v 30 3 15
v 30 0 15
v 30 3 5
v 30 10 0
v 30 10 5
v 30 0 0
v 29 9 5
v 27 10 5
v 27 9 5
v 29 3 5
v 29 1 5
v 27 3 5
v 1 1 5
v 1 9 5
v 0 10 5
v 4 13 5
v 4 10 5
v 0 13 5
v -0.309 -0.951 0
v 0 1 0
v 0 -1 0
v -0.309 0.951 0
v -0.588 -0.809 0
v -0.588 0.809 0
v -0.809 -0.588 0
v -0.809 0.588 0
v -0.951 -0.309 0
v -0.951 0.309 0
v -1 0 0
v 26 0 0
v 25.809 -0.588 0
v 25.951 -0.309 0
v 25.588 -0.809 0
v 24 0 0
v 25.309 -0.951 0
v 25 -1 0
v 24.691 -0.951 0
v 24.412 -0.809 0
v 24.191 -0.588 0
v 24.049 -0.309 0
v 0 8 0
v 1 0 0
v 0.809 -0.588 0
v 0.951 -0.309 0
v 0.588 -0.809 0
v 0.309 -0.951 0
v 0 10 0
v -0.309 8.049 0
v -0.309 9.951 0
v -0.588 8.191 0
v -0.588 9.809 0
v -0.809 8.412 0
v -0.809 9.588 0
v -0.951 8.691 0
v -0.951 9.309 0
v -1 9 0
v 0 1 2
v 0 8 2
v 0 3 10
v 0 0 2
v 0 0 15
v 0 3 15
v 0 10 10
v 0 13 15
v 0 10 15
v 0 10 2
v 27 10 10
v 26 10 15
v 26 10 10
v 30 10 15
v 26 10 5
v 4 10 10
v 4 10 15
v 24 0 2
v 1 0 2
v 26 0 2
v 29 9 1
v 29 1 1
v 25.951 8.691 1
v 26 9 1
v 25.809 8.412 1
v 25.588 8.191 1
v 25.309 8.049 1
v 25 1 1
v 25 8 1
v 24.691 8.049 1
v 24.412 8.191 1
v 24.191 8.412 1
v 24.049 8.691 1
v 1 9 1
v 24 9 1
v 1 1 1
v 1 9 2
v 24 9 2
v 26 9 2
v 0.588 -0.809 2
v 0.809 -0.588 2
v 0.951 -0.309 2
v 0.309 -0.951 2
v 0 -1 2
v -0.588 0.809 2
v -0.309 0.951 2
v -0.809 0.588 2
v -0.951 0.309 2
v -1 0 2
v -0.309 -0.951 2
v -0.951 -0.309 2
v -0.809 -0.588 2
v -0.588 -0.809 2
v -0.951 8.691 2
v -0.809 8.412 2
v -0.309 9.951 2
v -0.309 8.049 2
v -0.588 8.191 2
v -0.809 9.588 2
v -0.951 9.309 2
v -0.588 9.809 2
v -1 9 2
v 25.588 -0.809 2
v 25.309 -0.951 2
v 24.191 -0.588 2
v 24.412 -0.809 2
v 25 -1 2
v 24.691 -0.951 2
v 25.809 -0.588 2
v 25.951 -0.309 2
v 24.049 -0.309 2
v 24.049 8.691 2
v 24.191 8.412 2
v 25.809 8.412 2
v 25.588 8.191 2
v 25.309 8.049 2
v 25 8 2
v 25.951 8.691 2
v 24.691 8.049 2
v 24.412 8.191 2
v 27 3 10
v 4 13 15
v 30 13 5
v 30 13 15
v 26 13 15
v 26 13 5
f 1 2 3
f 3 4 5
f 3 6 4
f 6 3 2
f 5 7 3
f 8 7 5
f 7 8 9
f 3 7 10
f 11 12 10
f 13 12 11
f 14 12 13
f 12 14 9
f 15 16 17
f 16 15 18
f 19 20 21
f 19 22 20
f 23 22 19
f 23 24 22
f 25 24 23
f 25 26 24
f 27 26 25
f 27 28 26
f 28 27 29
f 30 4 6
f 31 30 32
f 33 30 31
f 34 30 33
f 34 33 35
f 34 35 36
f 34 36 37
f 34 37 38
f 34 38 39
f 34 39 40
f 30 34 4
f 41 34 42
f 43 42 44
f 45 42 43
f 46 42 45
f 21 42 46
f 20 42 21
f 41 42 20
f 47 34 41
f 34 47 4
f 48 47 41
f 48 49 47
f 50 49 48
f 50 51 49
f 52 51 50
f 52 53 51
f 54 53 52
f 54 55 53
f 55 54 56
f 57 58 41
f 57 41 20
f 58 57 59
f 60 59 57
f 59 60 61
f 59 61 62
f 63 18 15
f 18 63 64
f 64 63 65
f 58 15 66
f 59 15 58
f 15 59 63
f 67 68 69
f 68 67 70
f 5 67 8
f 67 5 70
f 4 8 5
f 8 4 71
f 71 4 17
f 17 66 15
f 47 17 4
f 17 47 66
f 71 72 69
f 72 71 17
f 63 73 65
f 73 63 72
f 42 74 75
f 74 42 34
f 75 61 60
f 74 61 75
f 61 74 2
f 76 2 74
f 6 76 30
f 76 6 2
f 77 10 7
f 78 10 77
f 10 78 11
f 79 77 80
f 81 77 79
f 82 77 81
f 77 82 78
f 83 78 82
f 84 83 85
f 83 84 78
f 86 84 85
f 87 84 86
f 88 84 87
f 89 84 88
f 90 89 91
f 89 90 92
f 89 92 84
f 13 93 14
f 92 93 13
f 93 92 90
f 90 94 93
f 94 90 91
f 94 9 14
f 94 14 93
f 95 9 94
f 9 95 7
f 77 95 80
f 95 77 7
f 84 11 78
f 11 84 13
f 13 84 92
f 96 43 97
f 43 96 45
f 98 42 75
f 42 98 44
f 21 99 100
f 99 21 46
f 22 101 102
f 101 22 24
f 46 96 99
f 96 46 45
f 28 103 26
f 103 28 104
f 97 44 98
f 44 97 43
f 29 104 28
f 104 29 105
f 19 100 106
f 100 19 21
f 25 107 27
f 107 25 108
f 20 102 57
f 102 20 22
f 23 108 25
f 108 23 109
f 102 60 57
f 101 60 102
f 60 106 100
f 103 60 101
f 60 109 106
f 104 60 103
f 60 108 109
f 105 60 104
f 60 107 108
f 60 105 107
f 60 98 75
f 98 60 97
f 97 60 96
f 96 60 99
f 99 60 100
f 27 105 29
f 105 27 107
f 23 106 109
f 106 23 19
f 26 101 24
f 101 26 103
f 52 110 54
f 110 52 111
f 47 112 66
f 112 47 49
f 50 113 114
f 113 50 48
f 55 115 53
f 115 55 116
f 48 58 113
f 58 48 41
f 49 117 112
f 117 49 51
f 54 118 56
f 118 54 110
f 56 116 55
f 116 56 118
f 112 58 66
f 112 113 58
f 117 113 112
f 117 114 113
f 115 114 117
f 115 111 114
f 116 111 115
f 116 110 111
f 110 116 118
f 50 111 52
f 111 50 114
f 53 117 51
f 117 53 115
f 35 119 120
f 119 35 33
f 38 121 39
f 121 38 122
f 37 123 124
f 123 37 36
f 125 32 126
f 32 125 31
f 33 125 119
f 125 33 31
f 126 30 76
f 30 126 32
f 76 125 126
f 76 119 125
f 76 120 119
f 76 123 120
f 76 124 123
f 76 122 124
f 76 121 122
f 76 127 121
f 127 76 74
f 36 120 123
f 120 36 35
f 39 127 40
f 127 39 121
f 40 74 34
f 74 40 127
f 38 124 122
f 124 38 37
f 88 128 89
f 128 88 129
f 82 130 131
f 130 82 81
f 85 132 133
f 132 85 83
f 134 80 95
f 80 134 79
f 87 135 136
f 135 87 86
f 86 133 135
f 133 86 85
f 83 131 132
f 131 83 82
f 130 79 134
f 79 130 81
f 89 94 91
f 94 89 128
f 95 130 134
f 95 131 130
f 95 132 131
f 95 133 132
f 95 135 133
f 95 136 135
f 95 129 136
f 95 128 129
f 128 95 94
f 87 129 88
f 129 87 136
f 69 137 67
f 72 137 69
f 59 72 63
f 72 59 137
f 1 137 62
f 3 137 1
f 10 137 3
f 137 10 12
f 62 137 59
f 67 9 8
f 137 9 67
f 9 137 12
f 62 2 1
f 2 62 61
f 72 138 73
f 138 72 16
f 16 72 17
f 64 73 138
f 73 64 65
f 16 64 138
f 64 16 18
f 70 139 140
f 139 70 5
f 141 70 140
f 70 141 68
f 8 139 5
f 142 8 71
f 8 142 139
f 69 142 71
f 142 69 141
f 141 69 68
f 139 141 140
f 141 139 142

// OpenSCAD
// Couch frame
difference() {
    cube([30, 10, 5]);
    translate([1, 1, 1]) cube([28, 8, 6]);
}

// Couch legs
for (x=[0,25]) {
    for (y=[0,9]) {
        translate([x,y,0]) cylinder(h=2, r=1, $fn=20);
    }
}

// Backrest
translate([0, 0, 5])
    cube([30, 3, 10]);

// Seat cushions
translate([0, 3, 5]) {
    cube([15, 7, 5]);
    translate([15, 0, 0]) cube([12, 7, 5]);
}

// Armrests
translate([0, 10, 5])
    cube([4, 3, 10]);
translate([26, 10, 5])
    cube([4, 3, 10]);
